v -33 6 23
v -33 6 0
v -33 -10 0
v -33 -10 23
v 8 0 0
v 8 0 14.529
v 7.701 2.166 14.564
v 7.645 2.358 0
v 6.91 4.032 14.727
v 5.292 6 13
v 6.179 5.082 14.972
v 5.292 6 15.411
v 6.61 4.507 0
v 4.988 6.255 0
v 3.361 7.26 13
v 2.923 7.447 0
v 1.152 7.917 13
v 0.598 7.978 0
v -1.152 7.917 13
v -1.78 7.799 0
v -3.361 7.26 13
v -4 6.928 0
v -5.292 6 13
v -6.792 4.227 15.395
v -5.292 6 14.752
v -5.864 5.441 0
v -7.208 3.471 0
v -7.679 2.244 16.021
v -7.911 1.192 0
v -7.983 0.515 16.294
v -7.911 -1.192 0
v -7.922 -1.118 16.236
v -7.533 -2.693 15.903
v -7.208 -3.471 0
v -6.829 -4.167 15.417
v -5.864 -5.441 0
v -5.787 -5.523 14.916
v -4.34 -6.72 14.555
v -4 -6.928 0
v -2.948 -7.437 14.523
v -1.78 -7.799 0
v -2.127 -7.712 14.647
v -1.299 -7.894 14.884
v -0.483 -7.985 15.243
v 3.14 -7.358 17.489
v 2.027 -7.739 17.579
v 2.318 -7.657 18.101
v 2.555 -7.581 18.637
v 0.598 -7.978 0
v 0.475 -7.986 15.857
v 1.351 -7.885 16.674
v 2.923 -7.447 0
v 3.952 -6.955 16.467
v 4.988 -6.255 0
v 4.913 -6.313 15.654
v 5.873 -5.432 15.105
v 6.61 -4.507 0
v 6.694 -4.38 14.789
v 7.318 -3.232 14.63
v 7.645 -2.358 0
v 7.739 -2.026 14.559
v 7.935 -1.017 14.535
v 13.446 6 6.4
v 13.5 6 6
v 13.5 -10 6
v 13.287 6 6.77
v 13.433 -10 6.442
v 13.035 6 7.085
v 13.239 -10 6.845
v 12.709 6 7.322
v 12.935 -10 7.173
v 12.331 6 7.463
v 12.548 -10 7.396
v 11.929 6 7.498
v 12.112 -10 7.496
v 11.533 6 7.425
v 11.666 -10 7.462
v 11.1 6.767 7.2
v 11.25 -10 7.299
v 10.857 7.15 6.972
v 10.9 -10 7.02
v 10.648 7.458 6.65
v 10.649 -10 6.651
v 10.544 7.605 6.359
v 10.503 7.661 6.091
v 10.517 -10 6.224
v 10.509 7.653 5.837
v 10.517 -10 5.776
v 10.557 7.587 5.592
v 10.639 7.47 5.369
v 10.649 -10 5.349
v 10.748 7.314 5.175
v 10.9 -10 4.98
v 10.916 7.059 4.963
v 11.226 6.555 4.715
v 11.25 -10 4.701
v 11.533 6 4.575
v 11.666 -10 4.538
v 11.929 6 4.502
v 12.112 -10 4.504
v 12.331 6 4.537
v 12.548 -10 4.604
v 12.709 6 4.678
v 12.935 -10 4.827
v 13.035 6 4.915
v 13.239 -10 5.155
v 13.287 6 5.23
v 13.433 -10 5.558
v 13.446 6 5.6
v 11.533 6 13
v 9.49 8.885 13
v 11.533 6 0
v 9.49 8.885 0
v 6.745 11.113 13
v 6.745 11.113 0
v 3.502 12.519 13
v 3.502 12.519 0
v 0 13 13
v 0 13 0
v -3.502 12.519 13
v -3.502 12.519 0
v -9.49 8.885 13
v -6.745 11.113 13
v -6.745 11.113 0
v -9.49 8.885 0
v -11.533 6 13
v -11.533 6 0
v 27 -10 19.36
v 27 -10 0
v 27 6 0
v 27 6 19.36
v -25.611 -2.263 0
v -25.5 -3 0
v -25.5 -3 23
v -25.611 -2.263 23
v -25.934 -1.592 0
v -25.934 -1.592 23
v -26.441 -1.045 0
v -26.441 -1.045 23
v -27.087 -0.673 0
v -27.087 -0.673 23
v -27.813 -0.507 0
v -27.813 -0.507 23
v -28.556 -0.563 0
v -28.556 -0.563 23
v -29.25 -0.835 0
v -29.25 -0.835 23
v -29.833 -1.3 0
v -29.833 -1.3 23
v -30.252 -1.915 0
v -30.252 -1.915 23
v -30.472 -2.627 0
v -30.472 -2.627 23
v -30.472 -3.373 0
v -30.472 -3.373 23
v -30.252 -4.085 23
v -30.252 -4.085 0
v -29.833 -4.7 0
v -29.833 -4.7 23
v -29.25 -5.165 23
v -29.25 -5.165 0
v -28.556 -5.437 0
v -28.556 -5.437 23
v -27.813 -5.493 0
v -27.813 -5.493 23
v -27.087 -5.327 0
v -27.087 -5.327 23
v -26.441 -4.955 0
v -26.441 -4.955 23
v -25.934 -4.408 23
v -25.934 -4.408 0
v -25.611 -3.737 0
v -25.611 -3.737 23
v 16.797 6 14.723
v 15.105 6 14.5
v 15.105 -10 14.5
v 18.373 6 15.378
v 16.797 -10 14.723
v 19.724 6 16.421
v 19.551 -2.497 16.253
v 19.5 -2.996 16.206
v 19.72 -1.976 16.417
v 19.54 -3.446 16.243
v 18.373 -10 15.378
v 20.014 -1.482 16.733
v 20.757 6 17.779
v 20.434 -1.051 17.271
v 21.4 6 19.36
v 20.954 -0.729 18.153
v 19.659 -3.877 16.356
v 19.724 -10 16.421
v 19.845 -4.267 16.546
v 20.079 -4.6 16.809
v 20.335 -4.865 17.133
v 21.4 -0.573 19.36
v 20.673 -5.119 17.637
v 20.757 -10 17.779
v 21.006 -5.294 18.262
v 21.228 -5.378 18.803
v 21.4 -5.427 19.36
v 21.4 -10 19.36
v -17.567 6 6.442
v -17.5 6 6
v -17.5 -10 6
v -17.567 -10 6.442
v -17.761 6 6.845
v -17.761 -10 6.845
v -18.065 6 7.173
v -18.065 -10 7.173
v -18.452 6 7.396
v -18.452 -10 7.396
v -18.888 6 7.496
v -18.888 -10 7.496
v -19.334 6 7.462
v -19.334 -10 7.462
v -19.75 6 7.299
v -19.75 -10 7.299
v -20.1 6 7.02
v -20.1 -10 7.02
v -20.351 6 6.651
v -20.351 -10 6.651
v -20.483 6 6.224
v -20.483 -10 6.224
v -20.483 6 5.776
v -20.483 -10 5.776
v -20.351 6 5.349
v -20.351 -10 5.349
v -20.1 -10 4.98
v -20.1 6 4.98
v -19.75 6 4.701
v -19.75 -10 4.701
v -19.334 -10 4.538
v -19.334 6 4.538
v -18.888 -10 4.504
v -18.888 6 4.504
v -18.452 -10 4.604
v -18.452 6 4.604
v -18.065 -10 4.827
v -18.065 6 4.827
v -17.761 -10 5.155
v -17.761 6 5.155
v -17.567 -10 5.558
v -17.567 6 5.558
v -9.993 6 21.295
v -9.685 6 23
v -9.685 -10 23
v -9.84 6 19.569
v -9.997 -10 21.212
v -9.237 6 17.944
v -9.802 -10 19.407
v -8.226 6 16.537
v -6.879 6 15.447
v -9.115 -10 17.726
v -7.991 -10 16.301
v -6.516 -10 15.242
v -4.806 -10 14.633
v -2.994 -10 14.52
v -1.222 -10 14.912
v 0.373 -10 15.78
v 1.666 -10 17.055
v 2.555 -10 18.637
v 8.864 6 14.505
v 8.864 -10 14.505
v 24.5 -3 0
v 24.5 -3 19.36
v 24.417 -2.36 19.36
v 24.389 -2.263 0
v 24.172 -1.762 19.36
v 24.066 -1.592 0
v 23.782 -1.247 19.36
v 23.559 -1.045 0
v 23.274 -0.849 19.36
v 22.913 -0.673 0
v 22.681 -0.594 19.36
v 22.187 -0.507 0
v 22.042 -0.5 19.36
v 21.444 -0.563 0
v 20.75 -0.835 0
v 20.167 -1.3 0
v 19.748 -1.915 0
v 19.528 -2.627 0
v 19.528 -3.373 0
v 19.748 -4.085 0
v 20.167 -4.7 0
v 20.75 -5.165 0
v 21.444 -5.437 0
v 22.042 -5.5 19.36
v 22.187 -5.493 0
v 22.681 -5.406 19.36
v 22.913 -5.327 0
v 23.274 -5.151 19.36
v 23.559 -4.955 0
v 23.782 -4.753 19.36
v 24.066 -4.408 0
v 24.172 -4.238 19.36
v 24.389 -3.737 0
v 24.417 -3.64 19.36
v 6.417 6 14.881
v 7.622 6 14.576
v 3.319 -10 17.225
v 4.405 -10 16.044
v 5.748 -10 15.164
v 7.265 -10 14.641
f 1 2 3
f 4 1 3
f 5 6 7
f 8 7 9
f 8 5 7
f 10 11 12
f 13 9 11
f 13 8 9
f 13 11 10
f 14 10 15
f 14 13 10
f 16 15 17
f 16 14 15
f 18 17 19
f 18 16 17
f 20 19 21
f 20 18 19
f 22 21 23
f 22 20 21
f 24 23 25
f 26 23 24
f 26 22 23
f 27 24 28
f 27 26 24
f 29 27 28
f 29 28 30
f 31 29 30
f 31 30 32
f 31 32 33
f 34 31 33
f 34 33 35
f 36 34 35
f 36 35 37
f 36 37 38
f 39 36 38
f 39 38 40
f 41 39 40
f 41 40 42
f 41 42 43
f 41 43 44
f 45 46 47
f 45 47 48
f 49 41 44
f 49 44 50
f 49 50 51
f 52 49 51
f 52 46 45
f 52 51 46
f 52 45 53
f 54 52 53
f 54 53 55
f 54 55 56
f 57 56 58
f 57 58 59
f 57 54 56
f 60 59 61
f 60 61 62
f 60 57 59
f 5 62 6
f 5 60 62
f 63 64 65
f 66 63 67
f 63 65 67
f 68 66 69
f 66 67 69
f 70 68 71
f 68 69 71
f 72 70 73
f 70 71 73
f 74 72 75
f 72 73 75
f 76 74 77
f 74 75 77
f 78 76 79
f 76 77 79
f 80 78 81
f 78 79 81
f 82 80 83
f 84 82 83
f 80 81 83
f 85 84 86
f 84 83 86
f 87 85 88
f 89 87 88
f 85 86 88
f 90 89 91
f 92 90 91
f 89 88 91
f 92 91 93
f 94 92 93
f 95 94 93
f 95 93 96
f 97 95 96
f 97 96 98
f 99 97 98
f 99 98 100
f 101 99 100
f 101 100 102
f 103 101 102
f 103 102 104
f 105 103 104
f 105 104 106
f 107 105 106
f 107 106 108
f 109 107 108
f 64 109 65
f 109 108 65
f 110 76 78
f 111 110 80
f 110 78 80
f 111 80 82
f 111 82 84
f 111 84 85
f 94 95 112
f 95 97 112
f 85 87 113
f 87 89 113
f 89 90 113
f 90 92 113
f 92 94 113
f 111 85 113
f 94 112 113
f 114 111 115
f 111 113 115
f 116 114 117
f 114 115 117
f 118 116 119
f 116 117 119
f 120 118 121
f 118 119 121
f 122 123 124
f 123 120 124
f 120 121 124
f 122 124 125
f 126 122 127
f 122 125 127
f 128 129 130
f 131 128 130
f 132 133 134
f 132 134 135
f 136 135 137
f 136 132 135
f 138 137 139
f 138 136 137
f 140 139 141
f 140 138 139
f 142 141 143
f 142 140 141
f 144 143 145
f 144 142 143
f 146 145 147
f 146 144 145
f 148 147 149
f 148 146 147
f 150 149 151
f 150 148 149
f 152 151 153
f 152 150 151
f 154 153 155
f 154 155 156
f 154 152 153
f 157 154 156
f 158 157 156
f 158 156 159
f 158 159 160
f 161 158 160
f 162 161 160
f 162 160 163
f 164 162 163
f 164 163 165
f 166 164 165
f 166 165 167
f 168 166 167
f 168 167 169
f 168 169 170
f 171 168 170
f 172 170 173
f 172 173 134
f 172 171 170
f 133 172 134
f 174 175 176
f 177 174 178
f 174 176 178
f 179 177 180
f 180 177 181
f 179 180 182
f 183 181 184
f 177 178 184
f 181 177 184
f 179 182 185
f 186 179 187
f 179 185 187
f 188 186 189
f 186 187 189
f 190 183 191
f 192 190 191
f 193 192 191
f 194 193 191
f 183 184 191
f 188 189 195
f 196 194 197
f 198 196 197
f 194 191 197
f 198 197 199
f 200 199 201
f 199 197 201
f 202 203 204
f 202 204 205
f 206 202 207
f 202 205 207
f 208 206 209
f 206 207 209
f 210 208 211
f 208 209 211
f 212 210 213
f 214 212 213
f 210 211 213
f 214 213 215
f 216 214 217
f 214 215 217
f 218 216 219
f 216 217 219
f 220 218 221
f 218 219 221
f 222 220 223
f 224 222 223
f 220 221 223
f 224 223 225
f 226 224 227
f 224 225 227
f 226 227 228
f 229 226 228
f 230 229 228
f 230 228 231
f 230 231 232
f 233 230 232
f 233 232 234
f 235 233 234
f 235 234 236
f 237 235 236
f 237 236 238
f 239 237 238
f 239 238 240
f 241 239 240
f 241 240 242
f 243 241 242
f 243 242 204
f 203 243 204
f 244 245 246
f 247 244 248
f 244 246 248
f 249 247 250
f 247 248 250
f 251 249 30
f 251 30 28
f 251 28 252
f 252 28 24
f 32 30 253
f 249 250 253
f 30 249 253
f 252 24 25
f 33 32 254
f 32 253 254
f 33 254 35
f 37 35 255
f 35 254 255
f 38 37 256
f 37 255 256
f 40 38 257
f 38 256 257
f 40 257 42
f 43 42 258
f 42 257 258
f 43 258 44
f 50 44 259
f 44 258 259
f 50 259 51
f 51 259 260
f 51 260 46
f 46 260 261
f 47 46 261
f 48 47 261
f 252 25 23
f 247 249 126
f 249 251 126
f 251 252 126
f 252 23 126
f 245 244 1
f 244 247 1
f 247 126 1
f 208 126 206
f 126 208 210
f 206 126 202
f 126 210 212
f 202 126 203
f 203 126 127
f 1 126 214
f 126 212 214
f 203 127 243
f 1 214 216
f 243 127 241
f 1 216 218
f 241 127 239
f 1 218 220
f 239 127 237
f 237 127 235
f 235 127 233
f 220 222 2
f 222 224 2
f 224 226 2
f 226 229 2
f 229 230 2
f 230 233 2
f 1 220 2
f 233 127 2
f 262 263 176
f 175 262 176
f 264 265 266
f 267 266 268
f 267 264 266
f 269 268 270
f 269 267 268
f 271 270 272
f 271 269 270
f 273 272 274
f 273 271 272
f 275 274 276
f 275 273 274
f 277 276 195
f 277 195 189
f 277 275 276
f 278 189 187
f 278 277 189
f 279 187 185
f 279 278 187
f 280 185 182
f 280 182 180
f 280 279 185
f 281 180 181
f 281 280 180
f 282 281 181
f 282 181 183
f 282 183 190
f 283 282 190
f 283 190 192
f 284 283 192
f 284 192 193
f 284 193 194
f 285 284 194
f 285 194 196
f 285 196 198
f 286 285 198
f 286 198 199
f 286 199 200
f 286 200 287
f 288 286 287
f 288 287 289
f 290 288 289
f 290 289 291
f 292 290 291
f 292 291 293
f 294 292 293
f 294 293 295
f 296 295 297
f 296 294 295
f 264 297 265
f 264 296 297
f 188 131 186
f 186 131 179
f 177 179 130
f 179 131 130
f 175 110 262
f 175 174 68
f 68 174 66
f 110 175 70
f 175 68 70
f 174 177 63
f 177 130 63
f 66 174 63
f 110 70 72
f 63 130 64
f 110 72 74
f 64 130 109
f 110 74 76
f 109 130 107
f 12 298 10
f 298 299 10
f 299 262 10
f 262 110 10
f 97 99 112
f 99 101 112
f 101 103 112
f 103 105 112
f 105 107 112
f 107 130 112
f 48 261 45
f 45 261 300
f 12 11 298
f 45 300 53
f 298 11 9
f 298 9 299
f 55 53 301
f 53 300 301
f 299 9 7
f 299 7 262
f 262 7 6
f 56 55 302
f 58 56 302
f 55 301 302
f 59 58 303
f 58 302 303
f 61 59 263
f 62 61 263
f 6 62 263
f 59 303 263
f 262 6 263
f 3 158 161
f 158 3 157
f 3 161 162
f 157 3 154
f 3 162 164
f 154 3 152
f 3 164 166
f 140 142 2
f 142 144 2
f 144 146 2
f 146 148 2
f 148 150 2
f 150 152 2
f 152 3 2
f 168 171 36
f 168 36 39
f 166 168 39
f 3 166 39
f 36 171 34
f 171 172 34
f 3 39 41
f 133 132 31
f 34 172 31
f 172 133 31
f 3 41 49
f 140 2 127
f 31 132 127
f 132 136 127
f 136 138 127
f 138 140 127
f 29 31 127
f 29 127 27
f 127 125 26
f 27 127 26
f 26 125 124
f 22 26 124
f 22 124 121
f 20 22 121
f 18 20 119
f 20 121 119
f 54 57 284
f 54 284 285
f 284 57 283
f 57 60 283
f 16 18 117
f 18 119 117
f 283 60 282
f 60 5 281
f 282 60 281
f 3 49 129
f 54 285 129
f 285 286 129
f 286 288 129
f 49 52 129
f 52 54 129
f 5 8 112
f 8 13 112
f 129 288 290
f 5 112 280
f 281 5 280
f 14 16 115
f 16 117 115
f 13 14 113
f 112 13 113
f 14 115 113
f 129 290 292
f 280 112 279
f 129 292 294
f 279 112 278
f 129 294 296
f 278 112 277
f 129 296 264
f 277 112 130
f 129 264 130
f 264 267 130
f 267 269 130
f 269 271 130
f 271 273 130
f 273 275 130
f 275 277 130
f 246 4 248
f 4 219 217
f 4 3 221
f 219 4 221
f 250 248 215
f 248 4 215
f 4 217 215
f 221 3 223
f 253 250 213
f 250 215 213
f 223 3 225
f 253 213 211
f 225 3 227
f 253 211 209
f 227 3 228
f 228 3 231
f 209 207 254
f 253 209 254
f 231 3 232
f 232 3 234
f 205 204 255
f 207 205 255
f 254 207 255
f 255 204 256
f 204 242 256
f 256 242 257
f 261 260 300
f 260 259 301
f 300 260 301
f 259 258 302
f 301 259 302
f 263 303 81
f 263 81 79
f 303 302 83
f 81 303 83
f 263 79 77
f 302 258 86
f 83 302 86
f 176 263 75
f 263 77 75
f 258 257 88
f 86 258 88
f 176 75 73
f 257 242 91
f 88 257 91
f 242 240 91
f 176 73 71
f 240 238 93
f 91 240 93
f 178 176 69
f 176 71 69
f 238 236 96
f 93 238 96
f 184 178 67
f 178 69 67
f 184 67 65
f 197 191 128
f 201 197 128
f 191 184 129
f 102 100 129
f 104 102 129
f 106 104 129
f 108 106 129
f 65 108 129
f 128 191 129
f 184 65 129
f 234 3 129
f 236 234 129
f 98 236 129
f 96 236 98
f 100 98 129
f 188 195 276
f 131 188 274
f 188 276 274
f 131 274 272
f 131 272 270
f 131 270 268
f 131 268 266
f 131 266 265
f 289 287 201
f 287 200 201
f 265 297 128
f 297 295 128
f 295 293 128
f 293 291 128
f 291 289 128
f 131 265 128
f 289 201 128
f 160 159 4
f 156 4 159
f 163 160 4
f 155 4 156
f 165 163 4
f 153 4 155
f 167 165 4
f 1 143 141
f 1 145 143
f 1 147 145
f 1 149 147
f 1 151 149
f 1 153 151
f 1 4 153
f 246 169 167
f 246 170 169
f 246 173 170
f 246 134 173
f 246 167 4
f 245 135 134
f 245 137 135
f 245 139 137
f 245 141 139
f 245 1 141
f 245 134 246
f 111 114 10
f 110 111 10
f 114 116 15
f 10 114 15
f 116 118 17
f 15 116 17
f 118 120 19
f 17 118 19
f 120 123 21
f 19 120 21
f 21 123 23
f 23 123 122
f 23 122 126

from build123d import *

# Parameters (mm, degrees)
F0_R     = 2.5
F0_R_2   = 8
F1_DEPTH = 23
F2_R     = 1.5
F3_DEPTH = 23.001
F4_W     = 8
F4_H     = 10
F5_DEPTH = 60.001


with BuildPart() as f1:
    # F0 (on Top) → F1 (new body)
    with BuildSketch(Plane.XY):
        with BuildLine():
            Line((-11.5325625947, 6), (-33, 6))
            Line((-33, 6), (-33, -10))
            Line((-33, -10), (27, -10))
            Line((27, -10), (27, 6))
            Line((27, 6), (11.5325625947, 6))
            ThreePointArc((11.5325625947, 6), (0, 13), (-11.5325625947, 6))
        make_face()
        with Locations((-28, -3)):
            Circle(F0_R, mode=Mode.SUBTRACT)
        Circle(F0_R_2, mode=Mode.SUBTRACT)
        with Locations((22, -3)):
            Circle(F0_R, mode=Mode.SUBTRACT)
    extrude(amount=F1_DEPTH)

    # F2 (on face) → F3 (cut, through all)
    with BuildSketch(Plane.XZ.offset(10)):
        with Locations((-19, 6)):
            Circle(F2_R)
        with Locations((12, 6)):
            Circle(F2_R)
        with BuildLine():
            ThreePointArc((2.555311013, 18.6371185947), (2.8878604237, 19.7978189788), (3, 21))
            ThreePointArc((3, 21), (2.8878604237, 22.2021810212), (2.555311013, 23.3628814053))
            ThreePointArc((2.555311013, 23.3628814053), (2.110622026, 21), (2.555311013, 18.6371185947))
        make_face()
        with BuildLine():
            ThreePointArc((2.555311013, 23.3628814053), (2.8878604237, 22.2021810212), (3, 21))
            ThreePointArc((3, 21), (2.8878604237, 19.7978189788), (2.555311013, 18.6371185947))
            ThreePointArc((2.555311013, 18.6371185947), (5.0491141915, 15.5625684423), (8.8639976231, 14.5049402769))
            ThreePointArc((8.8639976231, 14.5049402769), (10.4150204043, 14.7554706749), (11.860622026, 15.3708348754))
            ThreePointArc((11.860622026, 15.3708348754), (8.610622026, 21), (11.860622026, 26.6291651246))
            ThreePointArc((11.860622026, 26.6291651246), (6.4578111185, 27.1331399133), (2.555311013, 23.3628814053))
        make_face()
        with BuildLine():
            ThreePointArc((2.555311013, 18.6371185947), (2.110622026, 21), (2.555311013, 23.3628814053))
            ThreePointArc((2.555311013, 23.3628814053), (-10, 21), (2.555311013, 18.6371185947))
        make_face()
        with BuildLine():
            ThreePointArc((21.2952804645, 23), (17.4442382997, 27.0666494119), (11.860622026, 26.6291651246))
            ThreePointArc((11.860622026, 26.6291651246), (14.2397871506, 24.25), (15.110622026, 21))
            ThreePointArc((15.110622026, 21), (14.2397871506, 17.75), (11.860622026, 15.3708348754))
            ThreePointArc((11.860622026, 15.3708348754), (13.4258145924, 14.7221481451), (15.1054792462, 14.5000020345))
            ThreePointArc((15.1054792462, 14.5000020345), (19.0827263462, 15.854867614), (21.4002303392, 19.3596258759))
            ThreePointArc((21.4002303392, 19.3596258759), (21.5578095538, 20.173094333), (21.610622026, 21))
            ThreePointArc((21.610622026, 21), (21.5313026695, 22.0123537302), (21.2952804645, 23))
        make_face()
        with BuildLine():
            ThreePointArc((15.110622026, 21), (14.2397871506, 24.25), (11.860622026, 26.6291651246))
            ThreePointArc((11.860622026, 26.6291651246), (8.610622026, 21), (11.860622026, 15.3708348754))
            ThreePointArc((11.860622026, 15.3708348754), (14.2397871506, 17.75), (15.110622026, 21))
        make_face()
        with BuildLine():
            ThreePointArc((11.860622026, 15.3708348754), (10.4150204043, 14.7554706749), (8.8639976231, 14.5049402769))
            Line((8.8639976231, 14.5049402769), (15.1054792462, 14.5000020345))
            ThreePointArc((15.1054792462, 14.5000020345), (13.4258145924, 14.7221481451), (11.860622026, 15.3708348754))
        make_face()
        with BuildLine():
            Line((27, 23), (21.2952804645, 23))
            ThreePointArc((21.2952804645, 23), (21.5313026695, 22.0123537302), (21.610622026, 21))
            ThreePointArc((21.610622026, 21), (21.5578095538, 20.173094333), (21.4002303392, 19.3596258759))
            Line((21.4002303392, 19.3596258759), (27, 19.3596258759))
            Line((27, 19.3596258759), (27, 23))
        make_face()
    extrude(amount=-F3_DEPTH, mode=Mode.SUBTRACT)

    # F4 (on face) → F5 (cut, through all)
    with BuildSketch(Plane(origin=(-33, 0, 0), x_dir=(0, -1, 0), z_dir=(-1, 0, 0))):
        with Locations((-10, 18)):
            Rectangle(F4_W, F4_H)
    extrude(amount=-F5_DEPTH, mode=Mode.SUBTRACT)


solid = f1.part
